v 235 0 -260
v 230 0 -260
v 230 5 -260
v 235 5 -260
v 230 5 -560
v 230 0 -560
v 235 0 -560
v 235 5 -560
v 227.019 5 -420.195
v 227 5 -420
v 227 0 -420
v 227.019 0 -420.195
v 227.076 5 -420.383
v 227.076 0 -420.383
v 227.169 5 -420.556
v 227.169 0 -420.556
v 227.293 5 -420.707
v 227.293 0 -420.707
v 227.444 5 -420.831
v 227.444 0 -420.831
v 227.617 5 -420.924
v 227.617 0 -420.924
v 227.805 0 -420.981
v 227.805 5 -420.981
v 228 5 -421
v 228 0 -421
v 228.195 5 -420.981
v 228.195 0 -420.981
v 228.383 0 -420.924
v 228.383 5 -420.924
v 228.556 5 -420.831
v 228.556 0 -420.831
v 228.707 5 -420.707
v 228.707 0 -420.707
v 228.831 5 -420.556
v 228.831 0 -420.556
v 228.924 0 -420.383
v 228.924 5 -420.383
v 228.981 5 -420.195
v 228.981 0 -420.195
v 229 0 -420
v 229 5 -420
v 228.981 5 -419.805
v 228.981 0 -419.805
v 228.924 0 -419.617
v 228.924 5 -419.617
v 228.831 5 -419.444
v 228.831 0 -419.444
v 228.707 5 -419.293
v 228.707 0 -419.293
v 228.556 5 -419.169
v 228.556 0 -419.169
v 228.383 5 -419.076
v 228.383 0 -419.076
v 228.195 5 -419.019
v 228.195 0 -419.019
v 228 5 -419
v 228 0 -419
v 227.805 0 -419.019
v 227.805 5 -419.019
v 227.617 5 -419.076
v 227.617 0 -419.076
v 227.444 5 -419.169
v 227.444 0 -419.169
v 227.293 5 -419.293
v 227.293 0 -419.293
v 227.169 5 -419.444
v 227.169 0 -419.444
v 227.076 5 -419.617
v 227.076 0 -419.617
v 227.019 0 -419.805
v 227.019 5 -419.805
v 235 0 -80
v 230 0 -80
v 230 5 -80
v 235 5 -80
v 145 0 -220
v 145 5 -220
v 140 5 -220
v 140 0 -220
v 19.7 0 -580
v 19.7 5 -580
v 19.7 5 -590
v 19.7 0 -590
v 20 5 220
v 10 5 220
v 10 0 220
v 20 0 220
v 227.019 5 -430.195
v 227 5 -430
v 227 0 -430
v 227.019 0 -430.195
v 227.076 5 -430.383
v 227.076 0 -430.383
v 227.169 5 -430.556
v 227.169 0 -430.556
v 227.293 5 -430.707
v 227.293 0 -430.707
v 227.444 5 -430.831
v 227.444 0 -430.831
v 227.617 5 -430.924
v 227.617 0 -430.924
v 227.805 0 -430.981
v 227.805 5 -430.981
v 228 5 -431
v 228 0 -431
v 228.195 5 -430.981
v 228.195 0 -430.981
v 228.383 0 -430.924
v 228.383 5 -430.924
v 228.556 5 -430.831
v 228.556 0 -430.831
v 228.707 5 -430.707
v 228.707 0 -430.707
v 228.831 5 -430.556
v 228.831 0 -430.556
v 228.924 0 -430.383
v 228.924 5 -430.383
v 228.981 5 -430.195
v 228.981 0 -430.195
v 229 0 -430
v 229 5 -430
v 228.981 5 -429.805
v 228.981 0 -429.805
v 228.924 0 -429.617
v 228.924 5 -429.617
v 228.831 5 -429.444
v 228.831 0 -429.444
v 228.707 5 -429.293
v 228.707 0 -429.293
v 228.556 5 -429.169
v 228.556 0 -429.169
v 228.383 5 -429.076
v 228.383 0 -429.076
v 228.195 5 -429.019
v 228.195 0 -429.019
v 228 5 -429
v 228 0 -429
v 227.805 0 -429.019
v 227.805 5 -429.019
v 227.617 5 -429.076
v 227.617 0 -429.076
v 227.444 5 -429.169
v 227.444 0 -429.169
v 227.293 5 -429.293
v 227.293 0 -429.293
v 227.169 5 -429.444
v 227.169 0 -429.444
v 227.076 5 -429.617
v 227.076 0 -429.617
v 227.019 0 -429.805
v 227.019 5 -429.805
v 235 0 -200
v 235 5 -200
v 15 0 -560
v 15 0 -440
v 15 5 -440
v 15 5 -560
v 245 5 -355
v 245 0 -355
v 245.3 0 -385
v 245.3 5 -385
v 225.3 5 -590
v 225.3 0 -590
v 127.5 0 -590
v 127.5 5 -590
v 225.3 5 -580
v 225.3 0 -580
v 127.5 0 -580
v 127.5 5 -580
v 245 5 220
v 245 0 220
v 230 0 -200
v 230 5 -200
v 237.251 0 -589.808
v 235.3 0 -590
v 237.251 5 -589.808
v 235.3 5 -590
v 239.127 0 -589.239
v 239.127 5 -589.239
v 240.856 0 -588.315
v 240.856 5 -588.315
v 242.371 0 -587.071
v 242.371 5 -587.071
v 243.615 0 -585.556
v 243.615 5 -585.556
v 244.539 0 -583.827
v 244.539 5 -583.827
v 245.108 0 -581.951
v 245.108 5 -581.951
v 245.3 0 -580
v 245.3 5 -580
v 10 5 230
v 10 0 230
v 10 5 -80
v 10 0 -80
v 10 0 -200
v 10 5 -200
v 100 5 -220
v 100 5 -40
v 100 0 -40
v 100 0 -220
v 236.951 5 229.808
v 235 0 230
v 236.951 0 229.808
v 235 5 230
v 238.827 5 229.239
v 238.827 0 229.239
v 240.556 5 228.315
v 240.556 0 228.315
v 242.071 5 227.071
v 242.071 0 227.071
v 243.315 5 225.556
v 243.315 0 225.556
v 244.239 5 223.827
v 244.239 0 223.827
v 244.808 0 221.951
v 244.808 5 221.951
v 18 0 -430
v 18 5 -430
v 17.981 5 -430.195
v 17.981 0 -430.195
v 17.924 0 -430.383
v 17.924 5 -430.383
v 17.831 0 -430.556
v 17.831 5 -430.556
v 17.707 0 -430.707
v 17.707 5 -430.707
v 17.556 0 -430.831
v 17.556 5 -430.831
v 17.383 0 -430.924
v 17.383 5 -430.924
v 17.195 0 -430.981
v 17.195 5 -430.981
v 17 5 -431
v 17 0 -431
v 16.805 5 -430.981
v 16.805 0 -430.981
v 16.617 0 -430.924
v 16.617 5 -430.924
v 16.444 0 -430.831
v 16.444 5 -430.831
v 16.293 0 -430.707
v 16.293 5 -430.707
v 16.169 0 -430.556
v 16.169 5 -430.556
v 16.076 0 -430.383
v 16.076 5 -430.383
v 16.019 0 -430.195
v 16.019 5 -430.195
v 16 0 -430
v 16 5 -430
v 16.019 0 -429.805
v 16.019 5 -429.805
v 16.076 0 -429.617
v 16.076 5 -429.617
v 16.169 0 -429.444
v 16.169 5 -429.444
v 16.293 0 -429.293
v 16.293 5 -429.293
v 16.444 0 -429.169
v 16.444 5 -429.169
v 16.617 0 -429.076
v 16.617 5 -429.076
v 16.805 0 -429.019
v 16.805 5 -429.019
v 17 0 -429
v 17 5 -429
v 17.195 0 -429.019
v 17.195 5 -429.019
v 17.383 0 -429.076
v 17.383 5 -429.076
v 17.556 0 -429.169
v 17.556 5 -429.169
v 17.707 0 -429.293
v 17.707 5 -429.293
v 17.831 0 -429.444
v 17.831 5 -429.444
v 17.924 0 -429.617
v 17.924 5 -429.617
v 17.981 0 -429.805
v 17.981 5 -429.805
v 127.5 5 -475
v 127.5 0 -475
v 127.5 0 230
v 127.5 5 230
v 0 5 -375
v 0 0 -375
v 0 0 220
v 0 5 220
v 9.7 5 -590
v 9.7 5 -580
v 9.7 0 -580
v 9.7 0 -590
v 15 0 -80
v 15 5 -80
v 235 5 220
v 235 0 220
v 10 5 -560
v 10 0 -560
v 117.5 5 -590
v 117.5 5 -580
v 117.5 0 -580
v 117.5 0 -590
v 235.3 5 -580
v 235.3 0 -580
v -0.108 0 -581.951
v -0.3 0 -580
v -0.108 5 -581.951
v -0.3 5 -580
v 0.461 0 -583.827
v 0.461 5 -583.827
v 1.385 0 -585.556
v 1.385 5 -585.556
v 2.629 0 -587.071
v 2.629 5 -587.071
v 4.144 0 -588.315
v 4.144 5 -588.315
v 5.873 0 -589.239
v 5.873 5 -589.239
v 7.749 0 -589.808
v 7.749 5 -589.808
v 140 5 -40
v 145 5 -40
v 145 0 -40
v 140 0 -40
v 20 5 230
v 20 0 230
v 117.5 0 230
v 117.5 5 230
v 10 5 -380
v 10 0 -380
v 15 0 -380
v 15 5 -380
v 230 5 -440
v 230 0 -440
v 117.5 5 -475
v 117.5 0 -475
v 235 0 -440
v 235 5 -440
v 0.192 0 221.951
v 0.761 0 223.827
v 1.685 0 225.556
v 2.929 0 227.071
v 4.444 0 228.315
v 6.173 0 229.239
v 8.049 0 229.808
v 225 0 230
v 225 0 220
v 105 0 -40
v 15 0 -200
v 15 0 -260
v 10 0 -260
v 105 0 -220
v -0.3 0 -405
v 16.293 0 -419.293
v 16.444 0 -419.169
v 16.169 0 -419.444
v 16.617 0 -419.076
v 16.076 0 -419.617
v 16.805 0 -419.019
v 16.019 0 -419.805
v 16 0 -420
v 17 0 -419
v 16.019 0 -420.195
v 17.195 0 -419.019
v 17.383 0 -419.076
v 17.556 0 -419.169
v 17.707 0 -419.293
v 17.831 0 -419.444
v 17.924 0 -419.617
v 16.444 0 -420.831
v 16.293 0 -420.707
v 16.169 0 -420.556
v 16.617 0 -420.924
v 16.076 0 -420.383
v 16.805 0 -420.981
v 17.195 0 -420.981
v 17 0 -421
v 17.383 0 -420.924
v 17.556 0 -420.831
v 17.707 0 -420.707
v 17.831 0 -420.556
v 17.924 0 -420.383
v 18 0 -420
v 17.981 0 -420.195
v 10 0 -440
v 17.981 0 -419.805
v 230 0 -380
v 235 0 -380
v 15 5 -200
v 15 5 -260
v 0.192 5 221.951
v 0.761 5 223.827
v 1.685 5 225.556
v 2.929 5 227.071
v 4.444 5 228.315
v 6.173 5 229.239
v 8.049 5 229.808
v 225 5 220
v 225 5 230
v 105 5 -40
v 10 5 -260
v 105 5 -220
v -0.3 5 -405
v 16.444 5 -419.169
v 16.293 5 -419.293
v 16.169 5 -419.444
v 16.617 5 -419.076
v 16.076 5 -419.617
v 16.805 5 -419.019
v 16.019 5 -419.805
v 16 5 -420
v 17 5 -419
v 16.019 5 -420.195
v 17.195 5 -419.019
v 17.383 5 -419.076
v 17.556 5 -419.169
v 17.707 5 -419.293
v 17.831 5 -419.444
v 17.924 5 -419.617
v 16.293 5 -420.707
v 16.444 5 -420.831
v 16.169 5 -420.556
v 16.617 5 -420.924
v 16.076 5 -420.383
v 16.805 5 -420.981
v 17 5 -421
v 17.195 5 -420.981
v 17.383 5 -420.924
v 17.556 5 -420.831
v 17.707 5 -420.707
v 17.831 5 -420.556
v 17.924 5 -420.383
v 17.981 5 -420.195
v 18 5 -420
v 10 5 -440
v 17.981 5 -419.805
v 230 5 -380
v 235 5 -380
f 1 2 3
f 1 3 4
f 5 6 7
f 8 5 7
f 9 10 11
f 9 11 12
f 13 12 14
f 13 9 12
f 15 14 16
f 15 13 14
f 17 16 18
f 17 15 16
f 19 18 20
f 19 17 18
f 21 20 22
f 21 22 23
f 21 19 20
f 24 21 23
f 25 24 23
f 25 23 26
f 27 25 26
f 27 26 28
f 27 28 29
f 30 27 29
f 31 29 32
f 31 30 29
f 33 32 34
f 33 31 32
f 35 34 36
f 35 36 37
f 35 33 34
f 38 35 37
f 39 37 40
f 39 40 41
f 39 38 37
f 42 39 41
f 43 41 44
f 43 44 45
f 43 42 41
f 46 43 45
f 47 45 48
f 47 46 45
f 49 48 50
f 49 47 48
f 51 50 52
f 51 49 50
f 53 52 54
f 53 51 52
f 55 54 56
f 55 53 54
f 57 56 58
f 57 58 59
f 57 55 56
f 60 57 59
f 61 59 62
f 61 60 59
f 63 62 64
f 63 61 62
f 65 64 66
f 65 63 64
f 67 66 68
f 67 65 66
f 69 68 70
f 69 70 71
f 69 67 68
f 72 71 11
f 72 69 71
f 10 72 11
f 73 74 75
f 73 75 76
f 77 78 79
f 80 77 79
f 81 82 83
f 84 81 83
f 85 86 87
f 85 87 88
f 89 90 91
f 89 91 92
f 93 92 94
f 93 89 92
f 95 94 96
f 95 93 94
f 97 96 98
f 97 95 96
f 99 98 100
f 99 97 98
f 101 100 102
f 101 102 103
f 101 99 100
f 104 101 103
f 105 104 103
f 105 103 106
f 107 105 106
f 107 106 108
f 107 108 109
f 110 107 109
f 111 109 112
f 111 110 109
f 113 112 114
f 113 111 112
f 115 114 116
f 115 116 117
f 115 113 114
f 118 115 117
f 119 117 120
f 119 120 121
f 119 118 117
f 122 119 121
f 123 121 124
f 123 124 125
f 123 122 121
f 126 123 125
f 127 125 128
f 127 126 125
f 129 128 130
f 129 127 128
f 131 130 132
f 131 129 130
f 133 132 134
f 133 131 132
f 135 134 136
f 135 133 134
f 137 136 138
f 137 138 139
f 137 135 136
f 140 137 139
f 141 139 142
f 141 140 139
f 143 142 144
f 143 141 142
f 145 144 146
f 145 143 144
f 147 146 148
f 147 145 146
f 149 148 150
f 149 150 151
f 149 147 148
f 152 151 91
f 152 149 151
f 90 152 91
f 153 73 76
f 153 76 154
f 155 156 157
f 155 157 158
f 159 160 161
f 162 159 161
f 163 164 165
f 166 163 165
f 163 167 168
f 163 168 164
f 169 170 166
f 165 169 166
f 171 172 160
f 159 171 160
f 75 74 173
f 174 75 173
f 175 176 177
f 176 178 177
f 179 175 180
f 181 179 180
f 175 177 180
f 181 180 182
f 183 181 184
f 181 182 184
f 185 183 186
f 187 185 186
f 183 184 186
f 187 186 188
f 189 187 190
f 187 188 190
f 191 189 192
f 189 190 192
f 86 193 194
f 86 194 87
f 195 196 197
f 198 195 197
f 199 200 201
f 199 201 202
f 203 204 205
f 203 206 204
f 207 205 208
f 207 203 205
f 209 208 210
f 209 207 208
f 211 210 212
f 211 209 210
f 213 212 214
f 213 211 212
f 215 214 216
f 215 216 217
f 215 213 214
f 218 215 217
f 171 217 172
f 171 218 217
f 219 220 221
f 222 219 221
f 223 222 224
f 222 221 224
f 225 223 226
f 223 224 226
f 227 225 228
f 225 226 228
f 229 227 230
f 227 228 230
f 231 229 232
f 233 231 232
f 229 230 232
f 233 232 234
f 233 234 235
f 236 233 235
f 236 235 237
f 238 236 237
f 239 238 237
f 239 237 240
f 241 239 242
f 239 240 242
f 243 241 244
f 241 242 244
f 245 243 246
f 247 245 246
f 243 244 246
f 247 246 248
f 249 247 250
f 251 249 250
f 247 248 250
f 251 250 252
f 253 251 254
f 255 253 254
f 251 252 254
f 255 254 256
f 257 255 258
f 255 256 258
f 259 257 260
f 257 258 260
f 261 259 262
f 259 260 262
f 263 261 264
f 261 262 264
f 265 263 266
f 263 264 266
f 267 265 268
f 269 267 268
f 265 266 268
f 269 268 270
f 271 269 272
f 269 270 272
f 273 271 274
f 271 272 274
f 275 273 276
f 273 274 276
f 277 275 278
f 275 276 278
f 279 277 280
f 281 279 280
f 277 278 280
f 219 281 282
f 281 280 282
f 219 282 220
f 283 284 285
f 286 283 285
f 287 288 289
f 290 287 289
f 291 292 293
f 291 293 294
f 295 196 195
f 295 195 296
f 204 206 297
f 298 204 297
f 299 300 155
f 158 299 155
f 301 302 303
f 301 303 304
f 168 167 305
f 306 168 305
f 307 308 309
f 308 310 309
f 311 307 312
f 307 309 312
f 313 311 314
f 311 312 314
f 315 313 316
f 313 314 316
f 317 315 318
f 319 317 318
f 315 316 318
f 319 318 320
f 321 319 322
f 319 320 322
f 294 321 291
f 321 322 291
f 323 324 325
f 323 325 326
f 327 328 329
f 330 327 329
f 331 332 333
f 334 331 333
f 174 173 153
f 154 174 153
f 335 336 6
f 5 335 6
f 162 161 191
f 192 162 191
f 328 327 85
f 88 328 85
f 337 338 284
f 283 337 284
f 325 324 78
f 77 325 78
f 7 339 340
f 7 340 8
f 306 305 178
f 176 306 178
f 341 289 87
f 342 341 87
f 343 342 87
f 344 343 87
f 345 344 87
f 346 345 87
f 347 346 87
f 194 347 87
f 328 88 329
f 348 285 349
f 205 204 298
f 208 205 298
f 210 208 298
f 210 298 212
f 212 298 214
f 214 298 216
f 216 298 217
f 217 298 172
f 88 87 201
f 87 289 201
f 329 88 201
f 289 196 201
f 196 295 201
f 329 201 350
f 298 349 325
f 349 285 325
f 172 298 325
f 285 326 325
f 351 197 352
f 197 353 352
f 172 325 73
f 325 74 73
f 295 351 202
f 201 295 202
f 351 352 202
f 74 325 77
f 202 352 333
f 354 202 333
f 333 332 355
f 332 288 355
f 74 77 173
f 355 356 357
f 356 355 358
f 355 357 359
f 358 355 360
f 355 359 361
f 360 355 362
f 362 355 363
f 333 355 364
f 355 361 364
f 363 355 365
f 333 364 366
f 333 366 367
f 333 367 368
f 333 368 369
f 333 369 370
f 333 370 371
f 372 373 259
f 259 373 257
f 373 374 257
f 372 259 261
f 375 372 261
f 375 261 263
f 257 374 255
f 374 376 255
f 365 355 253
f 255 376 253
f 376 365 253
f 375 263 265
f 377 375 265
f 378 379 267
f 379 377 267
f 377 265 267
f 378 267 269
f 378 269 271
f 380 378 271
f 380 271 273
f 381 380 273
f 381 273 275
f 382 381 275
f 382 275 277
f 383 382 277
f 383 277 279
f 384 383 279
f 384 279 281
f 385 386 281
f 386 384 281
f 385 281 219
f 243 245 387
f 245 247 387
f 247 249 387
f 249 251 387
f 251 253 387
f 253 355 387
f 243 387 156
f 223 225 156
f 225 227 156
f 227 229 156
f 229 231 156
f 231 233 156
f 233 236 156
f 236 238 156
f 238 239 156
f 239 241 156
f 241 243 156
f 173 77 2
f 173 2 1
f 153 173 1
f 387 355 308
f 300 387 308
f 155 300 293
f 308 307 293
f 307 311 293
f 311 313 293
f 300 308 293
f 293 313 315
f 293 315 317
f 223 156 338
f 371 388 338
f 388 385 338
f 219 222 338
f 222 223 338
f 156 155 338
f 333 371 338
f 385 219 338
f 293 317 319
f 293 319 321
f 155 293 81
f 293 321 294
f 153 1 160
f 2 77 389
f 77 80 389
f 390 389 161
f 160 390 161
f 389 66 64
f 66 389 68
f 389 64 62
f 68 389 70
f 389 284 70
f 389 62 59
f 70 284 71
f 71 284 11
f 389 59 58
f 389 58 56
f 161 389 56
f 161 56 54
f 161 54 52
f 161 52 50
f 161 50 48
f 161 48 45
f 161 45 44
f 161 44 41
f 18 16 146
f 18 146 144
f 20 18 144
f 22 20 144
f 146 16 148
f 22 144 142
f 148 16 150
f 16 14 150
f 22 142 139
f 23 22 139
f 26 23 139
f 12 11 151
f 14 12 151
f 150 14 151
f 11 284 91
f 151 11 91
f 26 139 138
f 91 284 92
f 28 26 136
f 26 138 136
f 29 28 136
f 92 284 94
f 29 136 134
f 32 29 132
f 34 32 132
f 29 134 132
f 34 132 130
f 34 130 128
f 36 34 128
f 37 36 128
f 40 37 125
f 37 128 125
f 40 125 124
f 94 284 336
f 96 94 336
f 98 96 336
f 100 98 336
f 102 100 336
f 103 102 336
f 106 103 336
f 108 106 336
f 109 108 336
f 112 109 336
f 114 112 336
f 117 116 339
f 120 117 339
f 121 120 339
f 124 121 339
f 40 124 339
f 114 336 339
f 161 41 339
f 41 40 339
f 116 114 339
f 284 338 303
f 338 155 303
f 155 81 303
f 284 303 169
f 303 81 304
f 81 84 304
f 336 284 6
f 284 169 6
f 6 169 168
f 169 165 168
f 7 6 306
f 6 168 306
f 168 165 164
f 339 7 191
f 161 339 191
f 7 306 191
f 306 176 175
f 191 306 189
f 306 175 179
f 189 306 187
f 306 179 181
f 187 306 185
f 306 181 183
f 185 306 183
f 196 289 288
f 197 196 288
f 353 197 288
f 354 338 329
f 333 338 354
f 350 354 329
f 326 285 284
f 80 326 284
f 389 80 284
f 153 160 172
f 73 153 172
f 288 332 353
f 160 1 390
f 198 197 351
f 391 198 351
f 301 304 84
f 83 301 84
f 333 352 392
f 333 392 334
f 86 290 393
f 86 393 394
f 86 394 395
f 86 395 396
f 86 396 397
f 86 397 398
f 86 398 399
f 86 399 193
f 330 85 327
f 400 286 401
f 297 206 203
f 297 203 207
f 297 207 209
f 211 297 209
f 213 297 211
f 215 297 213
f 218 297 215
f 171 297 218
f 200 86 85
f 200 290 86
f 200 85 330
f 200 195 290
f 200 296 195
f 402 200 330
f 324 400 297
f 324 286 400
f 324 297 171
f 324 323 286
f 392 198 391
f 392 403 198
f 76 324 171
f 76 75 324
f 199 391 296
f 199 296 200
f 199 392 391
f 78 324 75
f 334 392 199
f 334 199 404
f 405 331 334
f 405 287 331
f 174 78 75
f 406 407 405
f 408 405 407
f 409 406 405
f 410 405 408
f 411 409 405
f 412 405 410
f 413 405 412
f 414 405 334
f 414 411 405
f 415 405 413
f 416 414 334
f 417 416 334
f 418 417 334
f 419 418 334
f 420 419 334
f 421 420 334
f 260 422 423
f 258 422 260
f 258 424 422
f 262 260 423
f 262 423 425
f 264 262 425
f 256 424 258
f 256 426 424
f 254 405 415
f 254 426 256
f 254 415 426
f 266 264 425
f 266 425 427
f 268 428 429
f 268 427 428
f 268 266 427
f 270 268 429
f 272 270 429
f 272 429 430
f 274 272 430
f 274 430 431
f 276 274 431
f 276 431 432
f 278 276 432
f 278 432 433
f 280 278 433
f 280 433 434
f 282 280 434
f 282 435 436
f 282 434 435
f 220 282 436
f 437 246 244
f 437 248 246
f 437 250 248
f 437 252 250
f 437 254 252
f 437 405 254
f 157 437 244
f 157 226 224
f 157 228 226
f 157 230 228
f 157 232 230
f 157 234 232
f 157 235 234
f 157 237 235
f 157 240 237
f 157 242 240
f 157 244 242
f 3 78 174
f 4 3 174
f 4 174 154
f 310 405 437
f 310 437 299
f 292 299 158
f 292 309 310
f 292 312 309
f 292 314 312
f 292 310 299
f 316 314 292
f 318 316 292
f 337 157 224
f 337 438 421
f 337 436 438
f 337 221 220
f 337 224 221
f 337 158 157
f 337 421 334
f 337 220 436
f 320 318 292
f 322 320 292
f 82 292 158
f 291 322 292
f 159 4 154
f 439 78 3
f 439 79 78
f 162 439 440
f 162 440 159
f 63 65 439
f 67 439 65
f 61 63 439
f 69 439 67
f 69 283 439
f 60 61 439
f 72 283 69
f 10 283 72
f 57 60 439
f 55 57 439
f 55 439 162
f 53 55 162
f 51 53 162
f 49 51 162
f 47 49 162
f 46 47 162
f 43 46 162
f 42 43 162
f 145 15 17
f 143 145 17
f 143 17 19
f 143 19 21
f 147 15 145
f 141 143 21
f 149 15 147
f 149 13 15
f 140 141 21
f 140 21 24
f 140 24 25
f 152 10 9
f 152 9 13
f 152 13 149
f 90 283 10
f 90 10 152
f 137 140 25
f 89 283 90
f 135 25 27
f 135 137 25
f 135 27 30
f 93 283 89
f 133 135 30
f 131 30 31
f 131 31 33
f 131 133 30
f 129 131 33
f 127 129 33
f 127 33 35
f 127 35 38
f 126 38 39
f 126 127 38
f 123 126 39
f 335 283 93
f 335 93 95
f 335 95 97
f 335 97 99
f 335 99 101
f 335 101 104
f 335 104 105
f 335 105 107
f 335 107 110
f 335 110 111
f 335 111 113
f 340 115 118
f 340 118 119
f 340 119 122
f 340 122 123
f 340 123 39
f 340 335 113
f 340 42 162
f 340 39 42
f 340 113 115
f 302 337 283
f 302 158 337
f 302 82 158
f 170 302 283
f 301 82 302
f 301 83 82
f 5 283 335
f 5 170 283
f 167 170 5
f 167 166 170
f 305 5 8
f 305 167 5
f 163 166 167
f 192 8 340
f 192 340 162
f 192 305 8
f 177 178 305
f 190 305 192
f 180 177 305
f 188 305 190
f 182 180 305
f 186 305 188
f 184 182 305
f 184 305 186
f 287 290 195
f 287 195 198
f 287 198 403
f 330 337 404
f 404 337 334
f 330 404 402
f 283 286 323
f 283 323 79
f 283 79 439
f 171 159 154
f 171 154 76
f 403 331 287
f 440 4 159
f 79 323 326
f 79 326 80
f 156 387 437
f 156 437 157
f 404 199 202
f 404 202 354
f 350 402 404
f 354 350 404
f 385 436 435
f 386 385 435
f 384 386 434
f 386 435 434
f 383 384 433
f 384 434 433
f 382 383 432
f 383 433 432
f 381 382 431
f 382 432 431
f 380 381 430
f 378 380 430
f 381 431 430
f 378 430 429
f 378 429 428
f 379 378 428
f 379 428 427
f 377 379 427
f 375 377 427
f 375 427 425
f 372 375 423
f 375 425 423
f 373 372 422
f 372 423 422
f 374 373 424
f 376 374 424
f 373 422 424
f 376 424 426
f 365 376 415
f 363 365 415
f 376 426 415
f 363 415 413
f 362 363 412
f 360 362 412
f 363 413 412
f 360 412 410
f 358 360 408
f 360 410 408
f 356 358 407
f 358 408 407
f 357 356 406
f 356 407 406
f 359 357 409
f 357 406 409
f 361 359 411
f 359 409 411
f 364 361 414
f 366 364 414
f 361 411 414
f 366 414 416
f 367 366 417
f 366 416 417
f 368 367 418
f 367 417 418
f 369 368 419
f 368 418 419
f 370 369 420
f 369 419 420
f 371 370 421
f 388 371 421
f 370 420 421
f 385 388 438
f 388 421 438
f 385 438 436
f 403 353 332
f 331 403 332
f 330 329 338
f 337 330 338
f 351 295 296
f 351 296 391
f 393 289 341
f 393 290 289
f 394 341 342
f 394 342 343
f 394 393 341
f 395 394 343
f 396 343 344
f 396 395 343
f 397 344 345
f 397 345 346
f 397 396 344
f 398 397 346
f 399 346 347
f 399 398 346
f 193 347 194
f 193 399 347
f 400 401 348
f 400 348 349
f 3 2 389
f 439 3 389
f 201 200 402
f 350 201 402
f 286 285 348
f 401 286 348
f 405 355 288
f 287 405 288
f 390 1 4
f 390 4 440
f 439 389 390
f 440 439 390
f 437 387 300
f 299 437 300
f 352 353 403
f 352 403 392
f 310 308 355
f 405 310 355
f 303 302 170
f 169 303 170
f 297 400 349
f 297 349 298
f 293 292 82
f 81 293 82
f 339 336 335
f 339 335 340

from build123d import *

# Parameters (mm, degrees)
SKETCH2_W           = 5
SKETCH2_H           = 120
BOSS_EXTRUDE1_DEPTH = 5
SKETCH3_R           = 1
SKETCH3_W           = 5
SKETCH3_H           = 180
CUT_EXTRUDE1_DEPTH  = 5
FILLET1_R           = 10
SKETCH4_W           = 10
SKETCH4_H           = 10
CUT_EXTRUDE2_DEPTH  = 10


with BuildPart() as part:
    # Sketch2 → Boss-Extrude1 (new body)
    with BuildSketch(Plane(origin=(0, 0, 0), x_dir=(1, 0, 0), z_dir=(0, 1, 0))):
        Polygon((0, 375), (0, 0), (0, -230), (10, -230), (15, -230), (117.5, -230), (117.5, 475), (127.5, 475), (127.5, -230), (230, -230), (235, -230), (245, -230), (245, -10), (245, 355), (245.3, 385), (245.3, 590), (245, 590), (0, 590), (-0.3, 590), (-0.3, 405), align=None)
        with Locations((12.5, 140)):
            Rectangle(SKETCH2_W, SKETCH2_H, mode=Mode.SUBTRACT)
        with Locations((232.5, 140)):
            Rectangle(SKETCH2_W, SKETCH2_H, mode=Mode.SUBTRACT)
        with Locations((12.5, 320)):
            Rectangle(SKETCH2_W, SKETCH2_H, mode=Mode.SUBTRACT)
        with Locations((12.5, 500)):
            Rectangle(SKETCH2_W, SKETCH2_H, mode=Mode.SUBTRACT)
        with Locations((232.5, 320)):
            Rectangle(SKETCH2_W, SKETCH2_H, mode=Mode.SUBTRACT)
        with Locations((232.5, 500)):
            Rectangle(SKETCH2_W, SKETCH2_H, mode=Mode.SUBTRACT)
    extrude(amount=BOSS_EXTRUDE1_DEPTH)

    # Sketch3 → Cut-Extrude1 (cut)
    with BuildSketch(Plane(origin=(0, 5, 0), x_dir=(1, 0, 0), z_dir=(0, 1, 0))):
        with Locations((17, 420)):
            Circle(SKETCH3_R)
        with Locations((17, 430)):
            Circle(SKETCH3_R)
        with Locations((102.5, 130)):
            Rectangle(SKETCH3_W, SKETCH3_H)
    cut_extrude1 = extrude(amount=-CUT_EXTRUDE1_DEPTH, mode=Mode.SUBTRACT)

    # Mirror1: Cut-Extrude1 across plane
    add(cut_extrude1.mirror(Plane.ZY.offset(-122.5)), mode=Mode.SUBTRACT)

    # Fillet1
    fillet1_edges = [part.edges().sort_by_distance(p)[0] for p in [
        (245, 2.5, 230),
        (0, 2.5, 230),
        (-0.3, 2.5, -590),
        (245.3, 2.5, -590),
    ]]
    fillet(fillet1_edges, radius=FILLET1_R)

    # Sketch4 → Cut-Extrude2 (cut)
    with BuildSketch(Plane(origin=(0, 5, 0), x_dir=(1, 0, 0), z_dir=(0, 1, 0))):
        with Locations((15, -225)):
            Rectangle(SKETCH4_W, SKETCH4_H)
        with Locations((230, -225)):
            Rectangle(SKETCH4_W, SKETCH4_H)
        with Locations((14.7, 585)):
            Rectangle(SKETCH4_W, SKETCH4_H)
        with Locations((230.3, 585)):
            Rectangle(SKETCH4_W, SKETCH4_H)
        with Locations((122.5, 585)):
            Rectangle(SKETCH4_W, SKETCH4_H)
    extrude(amount=-CUT_EXTRUDE2_DEPTH, mode=Mode.SUBTRACT)


solid = part.part
